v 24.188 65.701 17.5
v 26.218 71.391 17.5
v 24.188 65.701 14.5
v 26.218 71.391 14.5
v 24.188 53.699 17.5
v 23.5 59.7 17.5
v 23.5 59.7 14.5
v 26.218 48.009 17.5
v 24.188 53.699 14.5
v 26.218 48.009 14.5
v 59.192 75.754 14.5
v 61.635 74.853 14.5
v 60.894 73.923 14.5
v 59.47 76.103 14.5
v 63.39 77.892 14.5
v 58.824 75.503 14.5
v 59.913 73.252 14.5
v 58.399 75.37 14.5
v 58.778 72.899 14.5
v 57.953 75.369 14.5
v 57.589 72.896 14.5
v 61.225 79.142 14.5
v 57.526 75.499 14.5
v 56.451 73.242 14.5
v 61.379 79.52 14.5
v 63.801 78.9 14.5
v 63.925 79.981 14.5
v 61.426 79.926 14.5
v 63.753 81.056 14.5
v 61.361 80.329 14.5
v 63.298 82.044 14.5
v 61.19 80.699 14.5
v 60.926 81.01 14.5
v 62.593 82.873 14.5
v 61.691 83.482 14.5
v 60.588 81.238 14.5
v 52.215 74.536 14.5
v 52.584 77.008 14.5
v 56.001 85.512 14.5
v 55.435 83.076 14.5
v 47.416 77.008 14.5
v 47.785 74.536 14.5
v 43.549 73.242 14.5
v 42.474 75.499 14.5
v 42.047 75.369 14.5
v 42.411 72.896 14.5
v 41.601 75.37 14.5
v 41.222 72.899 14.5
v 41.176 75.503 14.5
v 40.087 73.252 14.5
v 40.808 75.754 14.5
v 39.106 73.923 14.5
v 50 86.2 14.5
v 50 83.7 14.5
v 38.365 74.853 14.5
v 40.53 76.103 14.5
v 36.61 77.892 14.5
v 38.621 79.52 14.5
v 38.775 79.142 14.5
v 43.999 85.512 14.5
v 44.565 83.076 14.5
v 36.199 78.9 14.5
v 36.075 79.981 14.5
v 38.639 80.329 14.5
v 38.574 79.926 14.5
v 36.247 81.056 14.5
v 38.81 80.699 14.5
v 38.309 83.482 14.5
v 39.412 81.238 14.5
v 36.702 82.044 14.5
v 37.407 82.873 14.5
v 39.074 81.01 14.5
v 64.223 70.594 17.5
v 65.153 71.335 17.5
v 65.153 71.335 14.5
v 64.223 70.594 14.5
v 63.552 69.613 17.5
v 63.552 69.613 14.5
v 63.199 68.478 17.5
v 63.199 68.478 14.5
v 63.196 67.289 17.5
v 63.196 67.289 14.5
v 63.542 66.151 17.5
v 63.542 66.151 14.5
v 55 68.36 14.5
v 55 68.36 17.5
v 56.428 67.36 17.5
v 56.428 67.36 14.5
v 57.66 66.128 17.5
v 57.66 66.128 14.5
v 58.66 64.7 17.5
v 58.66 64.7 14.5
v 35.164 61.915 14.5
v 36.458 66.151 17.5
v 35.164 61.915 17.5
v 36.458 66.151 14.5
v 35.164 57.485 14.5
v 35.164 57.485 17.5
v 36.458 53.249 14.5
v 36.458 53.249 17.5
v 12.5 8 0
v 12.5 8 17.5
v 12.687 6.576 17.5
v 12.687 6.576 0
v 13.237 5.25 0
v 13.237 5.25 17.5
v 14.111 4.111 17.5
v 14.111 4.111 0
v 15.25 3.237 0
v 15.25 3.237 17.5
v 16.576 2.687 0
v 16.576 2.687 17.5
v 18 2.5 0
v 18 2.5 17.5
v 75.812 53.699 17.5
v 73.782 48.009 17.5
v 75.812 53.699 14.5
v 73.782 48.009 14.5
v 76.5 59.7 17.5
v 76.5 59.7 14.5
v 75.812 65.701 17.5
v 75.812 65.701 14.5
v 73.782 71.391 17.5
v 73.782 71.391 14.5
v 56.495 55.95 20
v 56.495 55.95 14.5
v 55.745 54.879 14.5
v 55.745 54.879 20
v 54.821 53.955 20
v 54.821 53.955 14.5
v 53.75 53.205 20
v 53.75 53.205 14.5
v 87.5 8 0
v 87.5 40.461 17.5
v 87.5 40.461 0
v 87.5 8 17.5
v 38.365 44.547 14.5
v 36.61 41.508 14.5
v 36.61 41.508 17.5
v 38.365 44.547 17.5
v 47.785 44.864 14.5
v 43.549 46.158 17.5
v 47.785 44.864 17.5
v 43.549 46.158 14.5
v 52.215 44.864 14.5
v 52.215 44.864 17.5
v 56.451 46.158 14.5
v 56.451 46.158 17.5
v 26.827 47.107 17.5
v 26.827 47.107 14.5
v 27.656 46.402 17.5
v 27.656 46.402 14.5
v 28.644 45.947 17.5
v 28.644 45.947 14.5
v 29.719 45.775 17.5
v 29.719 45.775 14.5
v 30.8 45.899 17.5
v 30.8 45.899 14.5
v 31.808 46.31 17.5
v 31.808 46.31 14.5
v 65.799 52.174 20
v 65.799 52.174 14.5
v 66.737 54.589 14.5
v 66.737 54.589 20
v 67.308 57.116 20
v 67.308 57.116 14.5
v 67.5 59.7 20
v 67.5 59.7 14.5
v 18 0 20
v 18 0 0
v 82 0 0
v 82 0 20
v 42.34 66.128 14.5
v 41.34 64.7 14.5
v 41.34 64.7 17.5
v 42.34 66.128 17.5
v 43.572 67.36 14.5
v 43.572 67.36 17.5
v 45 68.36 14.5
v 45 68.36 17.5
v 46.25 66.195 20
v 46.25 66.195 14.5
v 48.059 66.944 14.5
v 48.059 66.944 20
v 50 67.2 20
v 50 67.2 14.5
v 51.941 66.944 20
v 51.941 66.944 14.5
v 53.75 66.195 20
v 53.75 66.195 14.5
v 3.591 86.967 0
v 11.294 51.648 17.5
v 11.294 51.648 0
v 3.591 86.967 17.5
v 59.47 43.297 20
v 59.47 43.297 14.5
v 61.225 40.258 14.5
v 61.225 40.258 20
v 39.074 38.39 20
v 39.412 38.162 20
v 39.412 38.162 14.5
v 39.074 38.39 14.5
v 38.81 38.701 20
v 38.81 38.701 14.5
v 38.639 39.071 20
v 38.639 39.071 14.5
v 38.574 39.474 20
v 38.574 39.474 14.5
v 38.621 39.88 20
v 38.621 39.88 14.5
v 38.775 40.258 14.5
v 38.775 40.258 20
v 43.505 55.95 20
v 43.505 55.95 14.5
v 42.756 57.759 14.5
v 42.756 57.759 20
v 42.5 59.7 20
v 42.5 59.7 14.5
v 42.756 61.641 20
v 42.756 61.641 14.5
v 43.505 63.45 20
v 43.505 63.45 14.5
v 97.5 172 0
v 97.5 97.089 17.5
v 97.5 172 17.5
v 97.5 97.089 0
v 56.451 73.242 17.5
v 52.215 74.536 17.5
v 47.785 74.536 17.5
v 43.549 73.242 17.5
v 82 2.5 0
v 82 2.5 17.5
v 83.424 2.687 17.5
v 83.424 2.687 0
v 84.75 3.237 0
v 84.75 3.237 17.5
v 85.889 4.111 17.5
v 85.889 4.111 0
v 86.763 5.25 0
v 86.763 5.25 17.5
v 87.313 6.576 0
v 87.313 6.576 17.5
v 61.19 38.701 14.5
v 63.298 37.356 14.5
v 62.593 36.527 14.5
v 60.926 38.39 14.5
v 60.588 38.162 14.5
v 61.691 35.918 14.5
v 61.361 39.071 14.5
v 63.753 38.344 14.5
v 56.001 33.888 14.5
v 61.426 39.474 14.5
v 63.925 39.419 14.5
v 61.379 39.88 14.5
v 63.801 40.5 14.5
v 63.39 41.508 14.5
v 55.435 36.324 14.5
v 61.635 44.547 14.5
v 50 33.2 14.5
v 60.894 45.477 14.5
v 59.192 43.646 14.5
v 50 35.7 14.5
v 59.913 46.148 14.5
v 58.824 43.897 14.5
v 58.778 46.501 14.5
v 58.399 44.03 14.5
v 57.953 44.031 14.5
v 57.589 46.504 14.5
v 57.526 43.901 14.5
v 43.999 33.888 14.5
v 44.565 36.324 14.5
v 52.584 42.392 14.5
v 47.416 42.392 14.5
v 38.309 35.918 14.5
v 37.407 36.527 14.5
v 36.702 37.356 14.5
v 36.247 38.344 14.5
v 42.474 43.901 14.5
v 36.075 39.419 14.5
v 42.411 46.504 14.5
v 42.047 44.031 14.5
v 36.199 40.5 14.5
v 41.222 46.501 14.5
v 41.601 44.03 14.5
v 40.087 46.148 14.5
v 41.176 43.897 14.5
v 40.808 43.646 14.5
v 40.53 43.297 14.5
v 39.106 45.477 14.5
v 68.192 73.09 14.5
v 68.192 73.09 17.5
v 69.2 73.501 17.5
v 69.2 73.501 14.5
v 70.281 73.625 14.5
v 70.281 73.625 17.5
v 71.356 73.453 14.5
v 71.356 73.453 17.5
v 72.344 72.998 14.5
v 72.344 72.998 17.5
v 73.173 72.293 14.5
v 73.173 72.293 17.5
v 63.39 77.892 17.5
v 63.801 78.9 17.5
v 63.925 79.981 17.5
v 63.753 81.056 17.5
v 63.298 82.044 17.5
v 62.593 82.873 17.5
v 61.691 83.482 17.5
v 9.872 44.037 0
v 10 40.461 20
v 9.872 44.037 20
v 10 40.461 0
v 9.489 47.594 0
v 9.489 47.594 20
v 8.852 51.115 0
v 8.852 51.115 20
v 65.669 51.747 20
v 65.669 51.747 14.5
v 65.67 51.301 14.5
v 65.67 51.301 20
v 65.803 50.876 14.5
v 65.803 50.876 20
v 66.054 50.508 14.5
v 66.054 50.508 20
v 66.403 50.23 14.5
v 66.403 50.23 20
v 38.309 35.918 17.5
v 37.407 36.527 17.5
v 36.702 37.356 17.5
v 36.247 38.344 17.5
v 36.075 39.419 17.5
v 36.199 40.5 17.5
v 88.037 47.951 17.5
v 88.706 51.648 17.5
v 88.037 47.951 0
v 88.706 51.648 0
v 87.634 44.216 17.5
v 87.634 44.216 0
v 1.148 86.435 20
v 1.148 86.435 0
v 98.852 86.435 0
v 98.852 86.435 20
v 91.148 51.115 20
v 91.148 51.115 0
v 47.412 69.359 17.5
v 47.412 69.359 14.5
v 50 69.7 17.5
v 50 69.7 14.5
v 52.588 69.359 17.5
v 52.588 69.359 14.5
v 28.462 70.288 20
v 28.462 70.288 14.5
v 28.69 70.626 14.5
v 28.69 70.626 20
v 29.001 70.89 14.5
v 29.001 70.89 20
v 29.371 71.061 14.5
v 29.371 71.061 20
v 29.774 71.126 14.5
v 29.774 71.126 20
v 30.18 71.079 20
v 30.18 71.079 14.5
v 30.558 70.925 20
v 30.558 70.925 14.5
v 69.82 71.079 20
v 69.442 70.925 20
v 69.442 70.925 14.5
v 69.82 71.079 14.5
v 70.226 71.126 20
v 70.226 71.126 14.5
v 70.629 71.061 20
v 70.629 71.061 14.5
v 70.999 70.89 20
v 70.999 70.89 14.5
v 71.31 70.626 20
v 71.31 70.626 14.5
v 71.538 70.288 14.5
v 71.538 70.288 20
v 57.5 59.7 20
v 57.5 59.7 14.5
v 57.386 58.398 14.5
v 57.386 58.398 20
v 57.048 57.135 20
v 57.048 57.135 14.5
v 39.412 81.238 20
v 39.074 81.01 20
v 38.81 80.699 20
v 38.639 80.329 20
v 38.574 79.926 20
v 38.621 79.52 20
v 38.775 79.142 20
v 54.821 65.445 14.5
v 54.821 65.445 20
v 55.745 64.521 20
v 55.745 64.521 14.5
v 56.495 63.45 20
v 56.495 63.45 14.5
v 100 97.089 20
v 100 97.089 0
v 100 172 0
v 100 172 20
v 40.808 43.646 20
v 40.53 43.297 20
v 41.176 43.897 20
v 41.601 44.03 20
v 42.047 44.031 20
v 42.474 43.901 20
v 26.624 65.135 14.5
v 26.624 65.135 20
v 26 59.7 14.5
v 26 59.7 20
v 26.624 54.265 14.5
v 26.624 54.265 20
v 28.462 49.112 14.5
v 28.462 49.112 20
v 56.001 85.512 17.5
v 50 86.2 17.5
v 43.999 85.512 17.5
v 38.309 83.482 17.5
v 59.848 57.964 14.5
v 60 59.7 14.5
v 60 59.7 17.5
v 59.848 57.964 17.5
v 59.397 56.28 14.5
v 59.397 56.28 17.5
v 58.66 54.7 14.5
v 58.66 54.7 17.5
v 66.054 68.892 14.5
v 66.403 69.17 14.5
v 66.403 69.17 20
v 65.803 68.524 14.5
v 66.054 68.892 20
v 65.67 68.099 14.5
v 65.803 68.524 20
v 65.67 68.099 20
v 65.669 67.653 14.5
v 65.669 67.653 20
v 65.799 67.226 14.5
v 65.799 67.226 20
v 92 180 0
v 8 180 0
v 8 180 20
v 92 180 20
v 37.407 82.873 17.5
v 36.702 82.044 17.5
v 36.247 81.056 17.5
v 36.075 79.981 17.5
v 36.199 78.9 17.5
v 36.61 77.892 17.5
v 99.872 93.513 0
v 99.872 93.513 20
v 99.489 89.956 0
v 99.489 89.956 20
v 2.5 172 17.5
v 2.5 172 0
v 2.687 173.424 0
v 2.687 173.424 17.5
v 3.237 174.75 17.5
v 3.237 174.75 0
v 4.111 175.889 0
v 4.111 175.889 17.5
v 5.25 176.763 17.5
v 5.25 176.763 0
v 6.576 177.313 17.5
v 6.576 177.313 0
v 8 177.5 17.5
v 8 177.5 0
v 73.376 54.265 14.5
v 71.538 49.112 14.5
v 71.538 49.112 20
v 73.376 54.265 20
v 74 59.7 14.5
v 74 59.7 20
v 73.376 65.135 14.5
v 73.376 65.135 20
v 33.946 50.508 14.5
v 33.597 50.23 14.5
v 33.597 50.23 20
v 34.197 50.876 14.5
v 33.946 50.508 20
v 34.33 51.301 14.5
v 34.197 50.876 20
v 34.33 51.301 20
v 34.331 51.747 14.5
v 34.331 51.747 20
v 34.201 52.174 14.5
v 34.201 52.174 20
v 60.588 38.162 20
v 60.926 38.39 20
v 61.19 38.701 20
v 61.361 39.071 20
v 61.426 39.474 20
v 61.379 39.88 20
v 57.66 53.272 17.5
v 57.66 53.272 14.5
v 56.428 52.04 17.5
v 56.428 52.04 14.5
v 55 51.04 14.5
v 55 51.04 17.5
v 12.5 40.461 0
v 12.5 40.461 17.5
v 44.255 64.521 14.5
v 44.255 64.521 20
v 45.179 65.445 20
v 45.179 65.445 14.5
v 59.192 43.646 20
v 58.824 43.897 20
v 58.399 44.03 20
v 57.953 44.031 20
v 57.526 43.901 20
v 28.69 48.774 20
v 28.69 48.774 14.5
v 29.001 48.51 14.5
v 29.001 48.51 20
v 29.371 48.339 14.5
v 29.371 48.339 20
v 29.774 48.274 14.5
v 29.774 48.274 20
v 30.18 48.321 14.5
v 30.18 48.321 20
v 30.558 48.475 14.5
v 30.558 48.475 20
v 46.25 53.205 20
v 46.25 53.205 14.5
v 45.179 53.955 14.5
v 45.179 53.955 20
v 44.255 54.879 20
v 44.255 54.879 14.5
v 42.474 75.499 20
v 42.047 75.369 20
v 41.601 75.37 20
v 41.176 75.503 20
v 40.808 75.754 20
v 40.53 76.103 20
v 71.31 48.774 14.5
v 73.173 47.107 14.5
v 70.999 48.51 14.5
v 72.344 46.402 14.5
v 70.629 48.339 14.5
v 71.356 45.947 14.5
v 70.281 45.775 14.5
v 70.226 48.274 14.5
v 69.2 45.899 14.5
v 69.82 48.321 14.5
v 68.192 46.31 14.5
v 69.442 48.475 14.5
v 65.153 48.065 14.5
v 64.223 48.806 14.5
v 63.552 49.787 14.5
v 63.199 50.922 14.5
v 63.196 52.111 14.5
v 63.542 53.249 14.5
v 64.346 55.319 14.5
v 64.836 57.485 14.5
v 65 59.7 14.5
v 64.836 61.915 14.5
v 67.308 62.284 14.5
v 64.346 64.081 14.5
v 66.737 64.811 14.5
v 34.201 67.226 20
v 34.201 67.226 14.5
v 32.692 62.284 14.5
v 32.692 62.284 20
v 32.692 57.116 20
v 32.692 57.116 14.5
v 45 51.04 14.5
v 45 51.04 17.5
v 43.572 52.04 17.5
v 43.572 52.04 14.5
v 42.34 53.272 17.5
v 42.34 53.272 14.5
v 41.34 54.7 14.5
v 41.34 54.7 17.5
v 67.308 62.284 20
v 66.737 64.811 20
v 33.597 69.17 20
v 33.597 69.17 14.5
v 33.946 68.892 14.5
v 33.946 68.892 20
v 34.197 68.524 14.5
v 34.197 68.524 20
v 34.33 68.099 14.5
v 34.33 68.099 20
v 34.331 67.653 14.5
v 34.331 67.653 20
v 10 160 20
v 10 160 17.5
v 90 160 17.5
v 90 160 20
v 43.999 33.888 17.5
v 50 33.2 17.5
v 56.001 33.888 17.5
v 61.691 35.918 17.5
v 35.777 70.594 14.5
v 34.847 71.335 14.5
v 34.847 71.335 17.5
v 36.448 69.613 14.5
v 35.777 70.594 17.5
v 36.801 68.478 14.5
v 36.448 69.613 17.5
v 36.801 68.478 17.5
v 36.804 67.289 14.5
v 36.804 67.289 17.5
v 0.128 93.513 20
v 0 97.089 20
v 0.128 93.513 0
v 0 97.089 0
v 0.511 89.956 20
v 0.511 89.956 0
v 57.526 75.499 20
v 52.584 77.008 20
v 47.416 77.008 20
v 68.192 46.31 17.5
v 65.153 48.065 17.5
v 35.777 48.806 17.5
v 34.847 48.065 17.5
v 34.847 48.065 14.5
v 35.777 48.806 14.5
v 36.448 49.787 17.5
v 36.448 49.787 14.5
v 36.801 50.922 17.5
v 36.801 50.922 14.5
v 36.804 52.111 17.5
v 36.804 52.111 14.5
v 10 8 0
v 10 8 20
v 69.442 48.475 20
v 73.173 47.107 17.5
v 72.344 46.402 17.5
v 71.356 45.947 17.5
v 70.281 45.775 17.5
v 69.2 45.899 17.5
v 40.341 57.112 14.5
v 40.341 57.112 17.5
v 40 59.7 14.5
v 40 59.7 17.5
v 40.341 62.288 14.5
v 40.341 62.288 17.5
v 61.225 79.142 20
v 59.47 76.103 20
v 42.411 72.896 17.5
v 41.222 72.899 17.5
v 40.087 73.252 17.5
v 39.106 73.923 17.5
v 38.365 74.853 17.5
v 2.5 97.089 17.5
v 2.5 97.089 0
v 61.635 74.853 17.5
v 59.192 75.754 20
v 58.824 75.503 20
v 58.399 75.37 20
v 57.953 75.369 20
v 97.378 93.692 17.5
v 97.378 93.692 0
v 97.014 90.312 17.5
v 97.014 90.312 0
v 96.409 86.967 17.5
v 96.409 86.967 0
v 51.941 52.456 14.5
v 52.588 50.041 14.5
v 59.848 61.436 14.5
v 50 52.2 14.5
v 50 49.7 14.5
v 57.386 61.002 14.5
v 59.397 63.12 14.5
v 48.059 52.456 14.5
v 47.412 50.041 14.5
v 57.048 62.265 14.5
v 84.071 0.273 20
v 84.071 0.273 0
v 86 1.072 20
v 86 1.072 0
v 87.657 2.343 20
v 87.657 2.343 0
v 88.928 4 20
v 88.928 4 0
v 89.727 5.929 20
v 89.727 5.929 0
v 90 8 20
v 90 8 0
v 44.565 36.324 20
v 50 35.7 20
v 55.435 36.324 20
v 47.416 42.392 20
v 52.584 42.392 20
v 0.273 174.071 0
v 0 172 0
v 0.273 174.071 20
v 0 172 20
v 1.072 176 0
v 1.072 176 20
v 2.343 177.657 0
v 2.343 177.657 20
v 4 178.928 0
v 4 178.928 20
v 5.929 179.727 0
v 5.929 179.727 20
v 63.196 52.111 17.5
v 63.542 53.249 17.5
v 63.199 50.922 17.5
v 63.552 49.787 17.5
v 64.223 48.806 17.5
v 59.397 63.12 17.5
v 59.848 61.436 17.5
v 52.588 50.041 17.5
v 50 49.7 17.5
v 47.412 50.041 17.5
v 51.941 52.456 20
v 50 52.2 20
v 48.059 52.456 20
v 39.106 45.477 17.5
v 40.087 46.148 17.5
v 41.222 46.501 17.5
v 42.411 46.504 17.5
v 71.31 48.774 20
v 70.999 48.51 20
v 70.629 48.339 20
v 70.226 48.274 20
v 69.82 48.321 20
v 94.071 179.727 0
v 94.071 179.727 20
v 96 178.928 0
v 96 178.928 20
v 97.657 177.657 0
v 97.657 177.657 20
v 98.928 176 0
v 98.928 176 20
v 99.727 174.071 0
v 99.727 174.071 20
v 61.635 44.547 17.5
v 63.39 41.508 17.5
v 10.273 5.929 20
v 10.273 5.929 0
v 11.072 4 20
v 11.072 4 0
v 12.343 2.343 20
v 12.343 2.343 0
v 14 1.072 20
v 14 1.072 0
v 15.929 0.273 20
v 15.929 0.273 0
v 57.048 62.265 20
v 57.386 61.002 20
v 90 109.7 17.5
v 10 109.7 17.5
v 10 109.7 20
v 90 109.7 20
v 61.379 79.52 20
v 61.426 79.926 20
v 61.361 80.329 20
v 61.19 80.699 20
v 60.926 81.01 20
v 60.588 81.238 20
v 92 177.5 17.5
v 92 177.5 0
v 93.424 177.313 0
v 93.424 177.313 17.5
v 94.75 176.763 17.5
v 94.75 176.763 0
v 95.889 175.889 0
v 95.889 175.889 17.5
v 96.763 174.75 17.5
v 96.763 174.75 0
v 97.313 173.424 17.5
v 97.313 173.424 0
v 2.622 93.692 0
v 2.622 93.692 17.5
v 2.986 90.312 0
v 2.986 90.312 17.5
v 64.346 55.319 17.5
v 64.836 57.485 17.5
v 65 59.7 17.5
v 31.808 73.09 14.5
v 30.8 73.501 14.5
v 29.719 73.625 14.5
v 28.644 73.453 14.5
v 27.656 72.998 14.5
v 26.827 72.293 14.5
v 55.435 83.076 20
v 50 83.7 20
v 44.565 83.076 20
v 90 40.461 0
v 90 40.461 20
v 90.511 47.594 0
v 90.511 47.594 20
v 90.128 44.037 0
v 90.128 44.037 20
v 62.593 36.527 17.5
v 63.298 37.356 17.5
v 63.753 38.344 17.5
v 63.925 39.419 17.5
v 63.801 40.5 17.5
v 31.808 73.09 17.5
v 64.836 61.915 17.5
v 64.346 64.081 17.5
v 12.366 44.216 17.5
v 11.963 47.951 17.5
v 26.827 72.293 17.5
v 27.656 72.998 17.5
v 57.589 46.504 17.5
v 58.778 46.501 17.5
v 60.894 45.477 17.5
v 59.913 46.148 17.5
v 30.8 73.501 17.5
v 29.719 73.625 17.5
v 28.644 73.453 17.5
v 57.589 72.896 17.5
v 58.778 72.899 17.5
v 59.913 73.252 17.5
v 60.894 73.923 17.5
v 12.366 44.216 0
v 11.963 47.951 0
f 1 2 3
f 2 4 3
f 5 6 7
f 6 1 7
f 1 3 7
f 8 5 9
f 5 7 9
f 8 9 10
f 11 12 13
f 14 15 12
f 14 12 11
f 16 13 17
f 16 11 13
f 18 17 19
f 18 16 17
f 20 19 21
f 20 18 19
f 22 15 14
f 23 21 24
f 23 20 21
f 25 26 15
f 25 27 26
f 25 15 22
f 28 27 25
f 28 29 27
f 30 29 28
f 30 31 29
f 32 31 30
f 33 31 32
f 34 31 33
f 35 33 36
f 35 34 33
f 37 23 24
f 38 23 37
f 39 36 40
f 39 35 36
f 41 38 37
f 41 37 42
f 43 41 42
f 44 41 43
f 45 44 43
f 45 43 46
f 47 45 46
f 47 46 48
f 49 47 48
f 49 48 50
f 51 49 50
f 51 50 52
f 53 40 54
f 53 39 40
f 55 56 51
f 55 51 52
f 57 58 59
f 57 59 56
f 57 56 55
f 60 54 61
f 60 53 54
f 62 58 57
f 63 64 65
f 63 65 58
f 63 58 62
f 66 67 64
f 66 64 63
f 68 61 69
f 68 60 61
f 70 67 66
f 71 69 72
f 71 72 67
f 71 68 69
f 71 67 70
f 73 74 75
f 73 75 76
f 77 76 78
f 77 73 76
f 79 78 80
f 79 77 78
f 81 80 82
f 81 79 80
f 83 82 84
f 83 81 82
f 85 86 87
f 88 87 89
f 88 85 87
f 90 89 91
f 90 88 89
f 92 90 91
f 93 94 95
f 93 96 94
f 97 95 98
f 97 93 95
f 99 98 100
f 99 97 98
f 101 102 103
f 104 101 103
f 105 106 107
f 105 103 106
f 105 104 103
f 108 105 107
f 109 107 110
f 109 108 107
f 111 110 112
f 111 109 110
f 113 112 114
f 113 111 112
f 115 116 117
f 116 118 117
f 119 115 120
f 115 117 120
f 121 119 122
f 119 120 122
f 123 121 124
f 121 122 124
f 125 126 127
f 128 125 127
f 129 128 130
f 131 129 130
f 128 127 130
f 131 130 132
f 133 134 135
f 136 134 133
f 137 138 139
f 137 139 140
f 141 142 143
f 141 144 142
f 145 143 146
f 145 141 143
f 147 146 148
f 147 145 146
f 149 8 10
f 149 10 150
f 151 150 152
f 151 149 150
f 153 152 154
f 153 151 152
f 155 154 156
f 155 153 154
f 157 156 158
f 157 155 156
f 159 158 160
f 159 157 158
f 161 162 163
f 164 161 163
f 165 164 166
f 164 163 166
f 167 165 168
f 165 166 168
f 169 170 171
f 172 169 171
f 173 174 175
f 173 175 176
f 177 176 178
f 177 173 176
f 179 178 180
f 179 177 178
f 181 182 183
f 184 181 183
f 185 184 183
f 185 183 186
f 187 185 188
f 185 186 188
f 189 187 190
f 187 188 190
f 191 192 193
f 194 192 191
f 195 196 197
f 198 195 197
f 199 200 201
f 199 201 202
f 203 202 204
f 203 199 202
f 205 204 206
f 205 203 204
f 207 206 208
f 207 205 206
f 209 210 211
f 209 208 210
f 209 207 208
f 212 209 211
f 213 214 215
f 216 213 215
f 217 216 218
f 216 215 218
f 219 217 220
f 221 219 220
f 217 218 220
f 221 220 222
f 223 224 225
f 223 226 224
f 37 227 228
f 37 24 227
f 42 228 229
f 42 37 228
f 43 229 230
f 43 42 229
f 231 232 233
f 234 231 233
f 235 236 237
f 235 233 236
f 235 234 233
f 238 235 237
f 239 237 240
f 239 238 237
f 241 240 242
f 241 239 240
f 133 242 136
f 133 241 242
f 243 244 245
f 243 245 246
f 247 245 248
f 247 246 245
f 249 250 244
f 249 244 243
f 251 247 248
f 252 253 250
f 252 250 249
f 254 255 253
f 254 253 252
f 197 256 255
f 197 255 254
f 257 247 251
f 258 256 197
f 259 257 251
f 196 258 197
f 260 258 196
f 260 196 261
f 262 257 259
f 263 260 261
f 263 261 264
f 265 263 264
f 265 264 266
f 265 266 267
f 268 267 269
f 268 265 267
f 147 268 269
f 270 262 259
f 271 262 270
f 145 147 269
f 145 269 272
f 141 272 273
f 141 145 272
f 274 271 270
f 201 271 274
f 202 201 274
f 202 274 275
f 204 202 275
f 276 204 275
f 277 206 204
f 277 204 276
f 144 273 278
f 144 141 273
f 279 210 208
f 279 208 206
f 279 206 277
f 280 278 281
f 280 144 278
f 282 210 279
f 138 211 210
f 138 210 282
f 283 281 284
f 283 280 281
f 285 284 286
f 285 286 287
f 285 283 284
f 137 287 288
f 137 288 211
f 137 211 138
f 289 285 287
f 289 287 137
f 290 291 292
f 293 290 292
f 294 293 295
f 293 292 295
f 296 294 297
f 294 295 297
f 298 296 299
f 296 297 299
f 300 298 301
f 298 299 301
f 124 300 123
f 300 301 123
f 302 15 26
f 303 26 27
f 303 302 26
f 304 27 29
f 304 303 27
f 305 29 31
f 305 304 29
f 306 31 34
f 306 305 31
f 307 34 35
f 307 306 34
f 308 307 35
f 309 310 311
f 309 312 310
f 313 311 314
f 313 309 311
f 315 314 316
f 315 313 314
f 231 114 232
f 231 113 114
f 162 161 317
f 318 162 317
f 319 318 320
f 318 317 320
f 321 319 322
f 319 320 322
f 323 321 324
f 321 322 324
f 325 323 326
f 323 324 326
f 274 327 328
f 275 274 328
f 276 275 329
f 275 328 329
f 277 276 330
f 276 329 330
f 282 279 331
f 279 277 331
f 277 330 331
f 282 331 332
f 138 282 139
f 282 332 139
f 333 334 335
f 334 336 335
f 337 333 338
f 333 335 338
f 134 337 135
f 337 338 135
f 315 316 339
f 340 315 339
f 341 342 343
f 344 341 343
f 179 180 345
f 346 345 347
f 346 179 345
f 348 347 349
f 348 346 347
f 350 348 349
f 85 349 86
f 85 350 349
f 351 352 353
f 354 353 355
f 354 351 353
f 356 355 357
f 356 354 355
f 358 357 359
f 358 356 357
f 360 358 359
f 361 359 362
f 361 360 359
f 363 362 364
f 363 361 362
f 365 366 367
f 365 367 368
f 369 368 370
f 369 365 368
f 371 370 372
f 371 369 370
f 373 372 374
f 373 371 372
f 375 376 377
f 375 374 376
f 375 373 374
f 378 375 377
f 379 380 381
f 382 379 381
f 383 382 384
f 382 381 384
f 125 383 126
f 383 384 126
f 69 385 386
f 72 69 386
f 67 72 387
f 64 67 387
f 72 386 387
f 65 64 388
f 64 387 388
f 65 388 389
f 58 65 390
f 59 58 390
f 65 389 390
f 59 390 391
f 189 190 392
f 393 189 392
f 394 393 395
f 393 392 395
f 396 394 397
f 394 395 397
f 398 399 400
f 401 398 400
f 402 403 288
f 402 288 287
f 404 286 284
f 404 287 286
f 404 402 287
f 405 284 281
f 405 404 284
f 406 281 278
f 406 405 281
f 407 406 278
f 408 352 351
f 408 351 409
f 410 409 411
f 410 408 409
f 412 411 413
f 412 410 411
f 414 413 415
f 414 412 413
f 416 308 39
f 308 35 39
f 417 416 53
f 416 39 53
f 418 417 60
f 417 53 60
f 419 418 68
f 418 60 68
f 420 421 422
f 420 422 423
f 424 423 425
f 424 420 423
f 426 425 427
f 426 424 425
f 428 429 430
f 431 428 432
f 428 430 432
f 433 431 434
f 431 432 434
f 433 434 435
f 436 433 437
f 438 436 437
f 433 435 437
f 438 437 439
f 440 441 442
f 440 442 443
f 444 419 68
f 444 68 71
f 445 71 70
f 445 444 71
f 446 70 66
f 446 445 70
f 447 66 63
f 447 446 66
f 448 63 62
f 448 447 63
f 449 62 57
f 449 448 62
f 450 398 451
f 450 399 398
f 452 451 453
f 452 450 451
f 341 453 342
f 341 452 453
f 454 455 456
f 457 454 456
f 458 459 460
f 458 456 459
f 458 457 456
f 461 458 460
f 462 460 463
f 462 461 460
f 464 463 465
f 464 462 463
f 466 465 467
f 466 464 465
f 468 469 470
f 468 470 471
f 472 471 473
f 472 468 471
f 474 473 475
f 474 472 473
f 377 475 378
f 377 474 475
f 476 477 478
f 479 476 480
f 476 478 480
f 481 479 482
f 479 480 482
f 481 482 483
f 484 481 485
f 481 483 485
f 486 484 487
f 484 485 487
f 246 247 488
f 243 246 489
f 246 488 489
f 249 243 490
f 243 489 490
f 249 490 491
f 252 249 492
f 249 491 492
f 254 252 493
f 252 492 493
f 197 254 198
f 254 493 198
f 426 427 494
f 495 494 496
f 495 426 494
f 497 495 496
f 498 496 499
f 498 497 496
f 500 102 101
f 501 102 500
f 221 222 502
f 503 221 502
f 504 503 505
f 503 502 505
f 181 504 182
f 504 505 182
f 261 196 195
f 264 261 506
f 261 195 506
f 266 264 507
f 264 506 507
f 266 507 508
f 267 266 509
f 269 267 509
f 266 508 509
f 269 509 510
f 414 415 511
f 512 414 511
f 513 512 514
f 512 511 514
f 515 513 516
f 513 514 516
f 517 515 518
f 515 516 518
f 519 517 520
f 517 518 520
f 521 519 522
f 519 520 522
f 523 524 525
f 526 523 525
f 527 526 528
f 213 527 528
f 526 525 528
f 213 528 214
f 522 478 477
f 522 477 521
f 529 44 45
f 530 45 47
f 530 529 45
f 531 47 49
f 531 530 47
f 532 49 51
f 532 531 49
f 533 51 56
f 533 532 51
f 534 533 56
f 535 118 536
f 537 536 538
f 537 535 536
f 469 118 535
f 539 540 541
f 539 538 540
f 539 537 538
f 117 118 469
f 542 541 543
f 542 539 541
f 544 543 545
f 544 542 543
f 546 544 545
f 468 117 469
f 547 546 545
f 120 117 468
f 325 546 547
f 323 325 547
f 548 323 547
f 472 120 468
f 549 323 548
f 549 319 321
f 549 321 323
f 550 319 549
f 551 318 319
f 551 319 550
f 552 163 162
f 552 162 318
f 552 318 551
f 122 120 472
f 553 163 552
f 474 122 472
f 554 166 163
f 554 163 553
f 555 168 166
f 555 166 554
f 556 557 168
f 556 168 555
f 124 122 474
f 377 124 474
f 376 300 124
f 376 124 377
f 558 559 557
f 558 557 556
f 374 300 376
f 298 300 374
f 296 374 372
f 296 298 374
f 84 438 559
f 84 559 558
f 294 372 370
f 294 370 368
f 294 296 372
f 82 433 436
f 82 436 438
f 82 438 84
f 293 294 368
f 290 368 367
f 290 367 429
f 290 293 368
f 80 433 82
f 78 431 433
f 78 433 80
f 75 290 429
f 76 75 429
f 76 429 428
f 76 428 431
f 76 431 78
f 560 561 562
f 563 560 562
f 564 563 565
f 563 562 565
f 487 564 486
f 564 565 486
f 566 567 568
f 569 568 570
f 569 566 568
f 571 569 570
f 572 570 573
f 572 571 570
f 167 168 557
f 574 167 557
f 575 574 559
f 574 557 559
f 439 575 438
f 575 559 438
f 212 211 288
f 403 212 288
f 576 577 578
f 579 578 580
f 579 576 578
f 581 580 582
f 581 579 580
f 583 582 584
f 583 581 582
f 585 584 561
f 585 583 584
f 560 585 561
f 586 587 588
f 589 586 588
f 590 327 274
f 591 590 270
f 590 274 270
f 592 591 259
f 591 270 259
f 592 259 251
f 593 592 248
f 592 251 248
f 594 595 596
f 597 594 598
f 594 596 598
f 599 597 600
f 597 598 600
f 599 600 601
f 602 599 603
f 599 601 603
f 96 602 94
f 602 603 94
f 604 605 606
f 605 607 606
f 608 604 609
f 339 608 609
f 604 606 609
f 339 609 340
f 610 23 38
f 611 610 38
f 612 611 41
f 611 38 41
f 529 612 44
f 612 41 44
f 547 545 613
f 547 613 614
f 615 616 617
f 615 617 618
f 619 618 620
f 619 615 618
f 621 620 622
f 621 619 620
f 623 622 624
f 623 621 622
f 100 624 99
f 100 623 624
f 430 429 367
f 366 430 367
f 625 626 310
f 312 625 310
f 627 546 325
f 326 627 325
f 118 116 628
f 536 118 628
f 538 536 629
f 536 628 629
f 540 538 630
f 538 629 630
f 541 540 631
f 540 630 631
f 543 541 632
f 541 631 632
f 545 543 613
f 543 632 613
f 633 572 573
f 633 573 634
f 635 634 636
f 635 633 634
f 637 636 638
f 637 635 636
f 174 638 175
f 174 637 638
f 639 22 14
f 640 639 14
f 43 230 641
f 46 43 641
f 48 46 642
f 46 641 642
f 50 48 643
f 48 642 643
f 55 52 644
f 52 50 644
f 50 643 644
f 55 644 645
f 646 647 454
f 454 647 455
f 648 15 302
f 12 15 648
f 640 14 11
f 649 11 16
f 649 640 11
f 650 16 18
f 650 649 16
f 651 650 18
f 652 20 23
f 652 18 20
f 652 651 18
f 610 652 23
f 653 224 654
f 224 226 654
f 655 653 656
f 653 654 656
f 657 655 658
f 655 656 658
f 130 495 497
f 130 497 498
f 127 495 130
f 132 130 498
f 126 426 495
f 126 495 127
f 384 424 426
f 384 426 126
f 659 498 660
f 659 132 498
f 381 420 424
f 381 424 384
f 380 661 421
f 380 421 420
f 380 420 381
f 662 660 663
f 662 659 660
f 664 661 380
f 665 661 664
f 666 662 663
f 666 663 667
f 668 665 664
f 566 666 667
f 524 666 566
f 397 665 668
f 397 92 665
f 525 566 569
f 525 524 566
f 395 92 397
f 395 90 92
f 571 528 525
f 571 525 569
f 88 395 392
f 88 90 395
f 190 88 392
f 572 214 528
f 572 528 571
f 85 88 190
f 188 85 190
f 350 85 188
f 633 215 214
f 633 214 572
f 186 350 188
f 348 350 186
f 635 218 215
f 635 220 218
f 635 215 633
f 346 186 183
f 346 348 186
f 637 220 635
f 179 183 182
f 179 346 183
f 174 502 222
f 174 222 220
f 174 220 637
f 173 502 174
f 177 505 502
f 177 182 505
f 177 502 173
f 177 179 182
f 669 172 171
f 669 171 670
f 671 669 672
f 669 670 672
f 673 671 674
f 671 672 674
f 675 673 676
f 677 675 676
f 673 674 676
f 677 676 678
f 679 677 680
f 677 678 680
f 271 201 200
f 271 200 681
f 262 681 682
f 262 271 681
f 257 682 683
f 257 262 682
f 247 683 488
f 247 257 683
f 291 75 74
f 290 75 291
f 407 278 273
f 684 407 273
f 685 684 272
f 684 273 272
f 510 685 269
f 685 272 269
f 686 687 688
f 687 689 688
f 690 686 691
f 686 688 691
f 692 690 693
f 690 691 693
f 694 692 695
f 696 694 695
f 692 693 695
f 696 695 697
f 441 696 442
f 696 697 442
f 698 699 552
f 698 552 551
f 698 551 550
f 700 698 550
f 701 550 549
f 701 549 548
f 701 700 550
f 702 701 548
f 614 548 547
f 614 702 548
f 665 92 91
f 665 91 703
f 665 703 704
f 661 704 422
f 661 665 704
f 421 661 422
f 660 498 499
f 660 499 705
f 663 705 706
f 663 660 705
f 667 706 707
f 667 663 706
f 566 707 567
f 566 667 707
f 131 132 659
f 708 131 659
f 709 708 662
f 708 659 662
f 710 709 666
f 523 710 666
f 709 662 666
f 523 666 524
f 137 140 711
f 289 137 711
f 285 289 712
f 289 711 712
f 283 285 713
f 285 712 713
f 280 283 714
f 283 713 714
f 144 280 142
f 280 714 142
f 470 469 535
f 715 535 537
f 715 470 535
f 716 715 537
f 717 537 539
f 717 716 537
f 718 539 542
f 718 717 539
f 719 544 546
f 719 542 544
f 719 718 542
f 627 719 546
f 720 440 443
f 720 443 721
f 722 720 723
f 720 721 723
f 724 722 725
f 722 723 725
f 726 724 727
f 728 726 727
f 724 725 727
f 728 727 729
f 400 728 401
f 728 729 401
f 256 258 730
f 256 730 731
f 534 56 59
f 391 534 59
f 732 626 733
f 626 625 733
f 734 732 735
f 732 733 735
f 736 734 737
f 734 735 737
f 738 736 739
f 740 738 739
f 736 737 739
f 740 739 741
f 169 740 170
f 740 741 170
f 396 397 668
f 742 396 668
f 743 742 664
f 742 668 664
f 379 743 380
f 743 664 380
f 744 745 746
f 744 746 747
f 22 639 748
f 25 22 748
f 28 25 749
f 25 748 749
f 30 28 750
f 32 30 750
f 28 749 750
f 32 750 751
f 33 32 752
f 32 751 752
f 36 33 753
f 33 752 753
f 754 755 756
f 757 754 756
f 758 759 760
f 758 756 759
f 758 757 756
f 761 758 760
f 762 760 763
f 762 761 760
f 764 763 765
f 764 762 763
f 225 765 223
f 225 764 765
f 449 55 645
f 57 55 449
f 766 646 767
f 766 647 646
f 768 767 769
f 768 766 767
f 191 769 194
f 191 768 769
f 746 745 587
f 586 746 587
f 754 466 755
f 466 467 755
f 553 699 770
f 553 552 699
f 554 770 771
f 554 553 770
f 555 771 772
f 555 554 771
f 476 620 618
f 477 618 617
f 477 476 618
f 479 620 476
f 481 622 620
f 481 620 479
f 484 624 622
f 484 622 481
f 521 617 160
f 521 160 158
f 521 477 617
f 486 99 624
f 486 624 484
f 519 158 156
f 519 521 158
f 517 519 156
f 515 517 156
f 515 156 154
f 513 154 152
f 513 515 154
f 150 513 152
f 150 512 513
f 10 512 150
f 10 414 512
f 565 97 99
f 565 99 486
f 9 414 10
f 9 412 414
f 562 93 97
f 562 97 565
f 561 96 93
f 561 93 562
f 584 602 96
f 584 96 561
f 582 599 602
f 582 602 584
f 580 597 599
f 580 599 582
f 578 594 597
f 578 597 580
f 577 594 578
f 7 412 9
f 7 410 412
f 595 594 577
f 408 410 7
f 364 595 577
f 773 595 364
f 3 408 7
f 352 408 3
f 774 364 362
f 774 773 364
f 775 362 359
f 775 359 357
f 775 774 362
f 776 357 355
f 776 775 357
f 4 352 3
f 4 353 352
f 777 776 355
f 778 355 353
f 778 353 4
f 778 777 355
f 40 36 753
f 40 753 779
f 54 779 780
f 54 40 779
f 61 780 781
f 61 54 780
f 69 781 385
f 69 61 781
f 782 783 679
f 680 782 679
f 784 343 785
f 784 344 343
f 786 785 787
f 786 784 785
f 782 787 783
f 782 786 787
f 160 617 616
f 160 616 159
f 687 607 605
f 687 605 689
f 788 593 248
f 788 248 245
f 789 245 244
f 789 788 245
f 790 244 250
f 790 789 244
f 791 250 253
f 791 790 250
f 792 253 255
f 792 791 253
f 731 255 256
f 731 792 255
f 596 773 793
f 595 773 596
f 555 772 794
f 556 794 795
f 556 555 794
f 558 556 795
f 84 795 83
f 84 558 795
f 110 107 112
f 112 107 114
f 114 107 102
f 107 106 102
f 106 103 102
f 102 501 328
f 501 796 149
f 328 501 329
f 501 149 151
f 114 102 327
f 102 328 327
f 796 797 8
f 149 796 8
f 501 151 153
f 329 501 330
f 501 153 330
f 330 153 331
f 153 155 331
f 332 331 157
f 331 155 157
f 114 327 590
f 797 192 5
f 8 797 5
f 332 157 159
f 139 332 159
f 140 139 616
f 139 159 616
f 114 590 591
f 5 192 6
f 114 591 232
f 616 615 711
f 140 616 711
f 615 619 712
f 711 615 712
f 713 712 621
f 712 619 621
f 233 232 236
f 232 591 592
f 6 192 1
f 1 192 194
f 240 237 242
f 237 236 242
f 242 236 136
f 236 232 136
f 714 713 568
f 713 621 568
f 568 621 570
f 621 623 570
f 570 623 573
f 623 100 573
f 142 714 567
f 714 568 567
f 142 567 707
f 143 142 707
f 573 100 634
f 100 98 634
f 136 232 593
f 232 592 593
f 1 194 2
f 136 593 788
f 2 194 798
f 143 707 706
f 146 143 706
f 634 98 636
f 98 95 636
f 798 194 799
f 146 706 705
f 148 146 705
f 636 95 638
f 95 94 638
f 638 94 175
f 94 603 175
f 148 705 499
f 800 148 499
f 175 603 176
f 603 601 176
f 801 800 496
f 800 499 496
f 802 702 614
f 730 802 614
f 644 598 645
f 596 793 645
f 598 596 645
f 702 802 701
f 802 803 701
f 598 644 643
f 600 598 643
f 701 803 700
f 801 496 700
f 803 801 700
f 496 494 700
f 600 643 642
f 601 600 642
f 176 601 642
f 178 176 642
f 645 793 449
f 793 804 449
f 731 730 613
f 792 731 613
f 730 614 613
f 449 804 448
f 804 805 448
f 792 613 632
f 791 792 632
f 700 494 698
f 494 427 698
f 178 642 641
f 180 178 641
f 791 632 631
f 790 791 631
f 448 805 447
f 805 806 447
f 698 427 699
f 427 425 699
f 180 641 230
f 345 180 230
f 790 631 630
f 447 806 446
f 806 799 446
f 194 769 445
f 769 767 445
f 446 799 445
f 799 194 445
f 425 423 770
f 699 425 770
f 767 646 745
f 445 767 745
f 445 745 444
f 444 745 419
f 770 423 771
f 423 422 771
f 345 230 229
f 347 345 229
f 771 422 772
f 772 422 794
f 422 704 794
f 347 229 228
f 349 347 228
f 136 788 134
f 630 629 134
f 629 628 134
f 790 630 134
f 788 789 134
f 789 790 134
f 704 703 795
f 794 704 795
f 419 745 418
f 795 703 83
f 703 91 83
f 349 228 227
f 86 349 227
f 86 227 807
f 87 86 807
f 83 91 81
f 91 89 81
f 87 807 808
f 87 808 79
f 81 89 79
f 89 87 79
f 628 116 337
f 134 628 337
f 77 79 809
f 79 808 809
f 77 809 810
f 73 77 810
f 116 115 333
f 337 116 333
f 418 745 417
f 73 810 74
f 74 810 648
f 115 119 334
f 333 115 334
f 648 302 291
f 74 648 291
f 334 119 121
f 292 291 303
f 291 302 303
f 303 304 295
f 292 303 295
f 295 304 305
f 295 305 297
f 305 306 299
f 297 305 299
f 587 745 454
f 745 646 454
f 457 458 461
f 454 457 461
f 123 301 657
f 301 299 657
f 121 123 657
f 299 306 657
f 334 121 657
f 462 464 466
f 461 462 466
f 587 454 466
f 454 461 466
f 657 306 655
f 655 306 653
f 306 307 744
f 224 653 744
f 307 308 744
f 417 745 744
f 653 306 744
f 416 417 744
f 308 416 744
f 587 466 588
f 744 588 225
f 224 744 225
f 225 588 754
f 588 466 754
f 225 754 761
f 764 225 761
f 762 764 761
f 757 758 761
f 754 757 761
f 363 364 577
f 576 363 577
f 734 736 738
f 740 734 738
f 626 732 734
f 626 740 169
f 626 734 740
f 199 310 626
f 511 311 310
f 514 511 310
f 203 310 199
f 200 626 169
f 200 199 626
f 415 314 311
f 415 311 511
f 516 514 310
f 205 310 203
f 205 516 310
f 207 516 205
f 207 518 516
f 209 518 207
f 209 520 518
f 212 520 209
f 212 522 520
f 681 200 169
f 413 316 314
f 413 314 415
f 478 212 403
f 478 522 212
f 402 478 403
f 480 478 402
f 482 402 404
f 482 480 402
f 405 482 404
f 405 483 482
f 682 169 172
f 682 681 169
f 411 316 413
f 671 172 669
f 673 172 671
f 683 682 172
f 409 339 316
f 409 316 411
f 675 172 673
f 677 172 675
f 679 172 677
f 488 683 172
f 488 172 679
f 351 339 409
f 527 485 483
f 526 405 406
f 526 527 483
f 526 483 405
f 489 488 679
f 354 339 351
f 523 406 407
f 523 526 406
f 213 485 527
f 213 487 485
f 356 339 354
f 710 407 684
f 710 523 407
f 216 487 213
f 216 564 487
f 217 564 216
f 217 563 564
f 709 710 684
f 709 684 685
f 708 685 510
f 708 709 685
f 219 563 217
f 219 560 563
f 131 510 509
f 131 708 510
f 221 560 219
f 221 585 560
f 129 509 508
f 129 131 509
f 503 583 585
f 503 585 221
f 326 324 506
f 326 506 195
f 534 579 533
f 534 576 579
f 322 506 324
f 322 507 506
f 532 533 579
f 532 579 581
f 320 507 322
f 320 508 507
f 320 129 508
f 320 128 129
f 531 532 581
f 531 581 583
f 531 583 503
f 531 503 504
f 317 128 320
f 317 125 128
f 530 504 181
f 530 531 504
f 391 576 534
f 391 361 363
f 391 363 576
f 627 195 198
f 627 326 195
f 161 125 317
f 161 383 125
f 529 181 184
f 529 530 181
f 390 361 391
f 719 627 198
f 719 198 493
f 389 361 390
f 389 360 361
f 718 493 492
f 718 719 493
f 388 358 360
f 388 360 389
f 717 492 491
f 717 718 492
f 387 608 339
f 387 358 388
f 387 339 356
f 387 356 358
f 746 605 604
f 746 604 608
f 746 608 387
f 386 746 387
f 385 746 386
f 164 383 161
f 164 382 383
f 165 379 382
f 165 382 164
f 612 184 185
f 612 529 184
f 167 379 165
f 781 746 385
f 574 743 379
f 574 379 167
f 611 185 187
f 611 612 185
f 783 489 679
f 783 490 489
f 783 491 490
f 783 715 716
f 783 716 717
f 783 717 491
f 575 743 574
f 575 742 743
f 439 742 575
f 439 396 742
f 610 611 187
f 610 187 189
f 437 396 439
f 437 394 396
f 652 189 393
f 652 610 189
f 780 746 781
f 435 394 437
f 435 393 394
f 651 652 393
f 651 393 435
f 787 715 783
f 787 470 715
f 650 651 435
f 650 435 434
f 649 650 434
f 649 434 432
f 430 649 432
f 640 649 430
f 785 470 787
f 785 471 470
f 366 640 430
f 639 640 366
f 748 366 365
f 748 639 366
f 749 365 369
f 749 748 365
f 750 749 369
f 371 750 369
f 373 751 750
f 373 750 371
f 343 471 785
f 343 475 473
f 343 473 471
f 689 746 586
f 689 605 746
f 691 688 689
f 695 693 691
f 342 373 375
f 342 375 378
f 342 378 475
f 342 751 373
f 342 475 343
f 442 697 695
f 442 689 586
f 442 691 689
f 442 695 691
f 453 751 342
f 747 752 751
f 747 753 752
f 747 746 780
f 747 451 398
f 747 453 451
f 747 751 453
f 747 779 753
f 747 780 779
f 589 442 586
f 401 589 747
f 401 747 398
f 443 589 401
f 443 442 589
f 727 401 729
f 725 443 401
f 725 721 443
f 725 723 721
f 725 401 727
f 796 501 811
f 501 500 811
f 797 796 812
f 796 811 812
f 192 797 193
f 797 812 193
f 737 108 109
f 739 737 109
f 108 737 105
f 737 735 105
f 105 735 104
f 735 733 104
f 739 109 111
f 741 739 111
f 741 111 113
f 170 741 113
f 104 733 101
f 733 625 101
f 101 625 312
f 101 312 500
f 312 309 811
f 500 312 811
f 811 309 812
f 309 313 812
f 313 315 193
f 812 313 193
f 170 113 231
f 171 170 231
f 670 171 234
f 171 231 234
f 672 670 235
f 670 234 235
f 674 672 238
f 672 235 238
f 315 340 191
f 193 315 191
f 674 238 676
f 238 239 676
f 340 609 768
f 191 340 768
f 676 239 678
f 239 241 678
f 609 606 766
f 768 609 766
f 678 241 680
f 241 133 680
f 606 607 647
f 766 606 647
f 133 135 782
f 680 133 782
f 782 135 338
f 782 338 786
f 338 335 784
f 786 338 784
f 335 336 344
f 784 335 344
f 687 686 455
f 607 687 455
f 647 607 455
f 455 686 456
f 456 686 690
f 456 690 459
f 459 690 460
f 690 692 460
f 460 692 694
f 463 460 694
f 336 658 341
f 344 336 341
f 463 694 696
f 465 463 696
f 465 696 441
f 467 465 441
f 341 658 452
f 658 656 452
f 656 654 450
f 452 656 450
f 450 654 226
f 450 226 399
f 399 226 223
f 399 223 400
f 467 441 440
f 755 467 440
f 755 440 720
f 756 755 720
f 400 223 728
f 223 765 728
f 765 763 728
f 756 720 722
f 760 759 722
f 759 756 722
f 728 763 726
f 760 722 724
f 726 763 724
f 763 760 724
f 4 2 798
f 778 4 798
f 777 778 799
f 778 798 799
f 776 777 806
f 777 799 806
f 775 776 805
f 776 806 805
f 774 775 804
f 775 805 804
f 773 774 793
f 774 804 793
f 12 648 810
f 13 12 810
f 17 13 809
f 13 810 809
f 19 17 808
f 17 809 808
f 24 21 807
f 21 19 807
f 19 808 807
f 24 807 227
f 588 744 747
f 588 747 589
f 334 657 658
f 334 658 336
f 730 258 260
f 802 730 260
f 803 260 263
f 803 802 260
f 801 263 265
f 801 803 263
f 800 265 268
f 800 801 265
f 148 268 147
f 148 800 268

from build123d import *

# Parameters (mm, degrees)
ESBO_O1_W                = 100
ESBO_O1_H                = 180
ESBO_O1_R                = 24
ESBO_O1_W_2              = 80
ESBO_O1_H_2              = 50.3
RESSALTO_EXTRUS_O1_DEPTH = 20
CORTE_EXTRUS_O1_DEPTH    = 227.2
FILETE1_R                = 50
FILETE2_R                = 8
FILETE3_R                = 1.5
CASCA1_T                 = -2.5
CORTE_EXTRUS_O2_START    = 108.4
ESBO_O3_R                = 26.5
CORTE_EXTRUS_O2_DEPTH    = 105.4
ESBO_O4_W                = 85
ESBO_O4_H                = 55.3
CORTE_EXTRUS_O3_DEPTH    = 17.5


with BuildPart() as part:
    # Esboço1 → Ressalto-extrusão1 (new body)
    # profile 1 of 13: a face of its own
    with BuildSketch(Plane.XY):
        with Locations((50, 90)):
            Rectangle(ESBO_O1_W, ESBO_O1_H)
        with Locations((50, 59.7)):
            Circle(ESBO_O1_R, mode=Mode.SUBTRACT)
        with Locations((50, 134.85)):
            Rectangle(ESBO_O1_W_2, ESBO_O1_H_2, mode=Mode.SUBTRACT)
    # profile 2 of 13: a face of its own
    with BuildSketch(Plane.XY):
        with BuildLine():
            ThreePointArc((58.75, 74.855444566), (50, 77.2), (41.25, 74.855444566))
            Line((41.25, 74.855444566), (46.25, 66.195190528))
            ThreePointArc((46.25, 66.195190528), (50, 67.2), (53.75, 66.195190528))
            Line((53.75, 66.195190528), (58.75, 74.855444566))
        make_face()
    # profile 3 of 13: a face of its own
    with BuildSketch(Plane.XY):
        with BuildLine():
            Line((46.25, 66.195190528), (41.25, 74.855444566))
            ThreePointArc((41.25, 74.855444566), (37.625631329, 72.074368671), (34.844555434, 68.45))
            Line((34.844555434, 68.45), (43.504809472, 63.45))
            ThreePointArc((43.504809472, 63.45), (44.696699141, 65.003300859), (46.25, 66.195190528))
        make_face()
    # profile 4 of 13: a face of its own
    with BuildSketch(Plane.XY):
        with BuildLine():
            Line((43.504809472, 63.45), (34.844555434, 68.45))
            ThreePointArc((34.844555434, 68.45), (32.5, 59.7), (34.844555434, 50.95))
            Line((34.844555434, 50.95), (43.504809472, 55.95))
            ThreePointArc((43.504809472, 55.95), (42.5, 59.7), (43.504809472, 63.45))
        make_face()
    # profile 5 of 13: a face of its own
    with BuildSketch(Plane.XY):
        with BuildLine():
            Line((43.504809472, 55.95), (34.844555434, 50.95))
            ThreePointArc((34.844555434, 50.95), (37.625631329, 47.325631329), (41.25, 44.544555434))
            Line((41.25, 44.544555434), (46.25, 53.204809472))
            ThreePointArc((46.25, 53.204809472), (44.696699141, 54.396699141), (43.504809472, 55.95))
        make_face()
    # profile 6 of 13: a face of its own
    with BuildSketch(Plane.XY):
        with BuildLine():
            Line((58.75, 44.544555434), (53.75, 53.204809472))
            ThreePointArc((53.75, 53.204809472), (50, 52.2), (46.25, 53.204809472))
            Line((46.25, 53.204809472), (41.25, 44.544555434))
            ThreePointArc((41.25, 44.544555434), (50, 42.2), (58.75, 44.544555434))
        make_face()
    # profile 7 of 13: a face of its own
    with BuildSketch(Plane.XY):
        with BuildLine():
            ThreePointArc((67.5, 59.7), (66.90370196, 64.229333289), (65.155444566, 68.45))
            Line((65.155444566, 68.45), (56.495190528, 63.45))
            ThreePointArc((56.495190528, 63.45), (57.244443697, 61.641142838), (57.5, 59.7))
            ThreePointArc((57.5, 59.7), (57.244443697, 57.758857162), (56.495190528, 55.95))
            Line((56.495190528, 55.95), (65.155444566, 50.95))
            ThreePointArc((65.155444566, 50.95), (66.90370196, 55.170666711), (67.5, 59.7))
        make_face()
    # profile 8 of 13: a face of its own
    with BuildSketch(Plane.XY):
        with BuildLine():
            ThreePointArc((56.495190528, 55.95), (55.303300859, 54.396699141), (53.75, 53.204809472))
            Line((53.75, 53.204809472), (58.75, 44.544555434))
            ThreePointArc((58.75, 44.544555434), (62.374368671, 47.325631329), (65.155444566, 50.95))
            Line((65.155444566, 50.95), (56.495190528, 55.95))
        make_face()
    # profile 9 of 13: a face of its own
    with BuildSketch(Plane.XY):
        with BuildLine():
            ThreePointArc((65.155444566, 68.45), (62.374368671, 72.074368671), (58.75, 74.855444566))
            Line((58.75, 74.855444566), (53.75, 66.195190528))
            ThreePointArc((53.75, 66.195190528), (55.303300859, 65.003300859), (56.495190528, 63.45))
            Line((56.495190528, 63.45), (65.155444566, 68.45))
        make_face()
    # profile 10 of 13: a face of its own
    with BuildSketch(Plane.XY):
        with BuildLine():
            Line((41.25, 74.855444566), (38, 80.484609691))
            ThreePointArc((38, 80.484609691), (33.029437252, 76.670562748), (29.215390309, 71.7))
            Line((29.215390309, 71.7), (34.844555434, 68.45))
            ThreePointArc((34.844555434, 68.45), (37.625631329, 72.074368671), (41.25, 74.855444566))
        make_face()
    # profile 11 of 13: a face of its own
    with BuildSketch(Plane.XY):
        with BuildLine():
            Line((34.844555434, 50.95), (29.215390309, 47.7))
            ThreePointArc((29.215390309, 47.7), (33.029437252, 42.729437252), (38, 38.915390309))
            Line((38, 38.915390309), (41.25, 44.544555434))
            ThreePointArc((41.25, 44.544555434), (37.625631329, 47.325631329), (34.844555434, 50.95))
        make_face()
    # profile 12 of 13: a face of its own
    with BuildSketch(Plane.XY):
        with BuildLine():
            ThreePointArc((62, 38.915390309), (66.970562748, 42.729437252), (70.784609691, 47.7))
            Line((70.784609691, 47.7), (65.155444566, 50.95))
            ThreePointArc((65.155444566, 50.95), (62.374368671, 47.325631329), (58.75, 44.544555434))
            Line((58.75, 44.544555434), (62, 38.915390309))
        make_face()
    # profile 13 of 13: a face of its own
    with BuildSketch(Plane.XY):
        with BuildLine():
            ThreePointArc((70.784609691, 71.7), (66.970562748, 76.670562748), (62, 80.484609691))
            Line((62, 80.484609691), (58.75, 74.855444566))
            ThreePointArc((58.75, 74.855444566), (62.374368671, 72.074368671), (65.155444566, 68.45))
            Line((65.155444566, 68.45), (70.784609691, 71.7))
        make_face()
    extrude(amount=RESSALTO_EXTRUS_O1_DEPTH)

    # Esboço2 → Corte-extrusão1 (cut)
    with BuildSketch(Plane.XY.offset(20)):
        Polygon((10, 45.85), (0, 91.7), (0, 0), (10, 0), align=None)
        Polygon((90, 45.85), (90, 0), (100, 0), (100, 91.7), align=None)
    extrude(amount=-CORTE_EXTRUS_O1_DEPTH, mode=Mode.SUBTRACT)

    # Filete1
    filete1_edges = [part.edges().sort_by_distance(p)[0] for p in [
        (90, 45.85, 10),
        (0, 91.7, 10),
        (10, 45.85, 10),
        (100, 91.7, 10),
    ]]
    fillet(filete1_edges, radius=FILETE1_R)

    # Filete2
    filete2_edges = [part.edges().sort_by_distance(p)[0] for p in [
        (90, 0, 10),
        (0, 180, 10),
        (100, 180, 10),
        (10, 0, 10),
    ]]
    fillet(filete2_edges, radius=FILETE2_R)

    # Filete3
    filete3_edges = [part.edges().sort_by_distance(p)[0] for p in [
        (58.75, 74.855444566, 10),
        (62, 80.484609691, 10),
        (38, 80.484609691, 10),
        (41.25, 74.855444566, 10),
        (34.844555434, 68.45, 10),
        (29.215390309, 71.7, 10),
        (29.215390309, 47.7, 10),
        (34.844555434, 50.95, 10),
        (70.784609691, 47.7, 10),
        (70.784609691, 71.7, 10),
        (65.155444566, 68.45, 10),
        (65.155444566, 50.95, 10),
        (41.25, 44.544555434, 10),
        (38, 38.915390309, 10),
        (62, 38.915390309, 10),
        (58.75, 44.544555434, 10),
    ]]
    fillet(filete3_edges, radius=FILETE3_R)

    # Casca1
    casca1_openings = [part.faces().sort_by_distance(p)[0] for p in [
        (50, 40.944516246, 0),
    ]]
    offset(amount=CASCA1_T, openings=casca1_openings, kind=Kind.INTERSECTION)

    # Esboço3 → Corte-extrusão2 (cut)
    with BuildSketch(Plane(origin=(0, 0, 17.5), x_dir=(-1, 0, 0), z_dir=(0, 0, -1)).offset(CORTE_EXTRUS_O2_START)):
        with Locations((-50, 59.7)):
            Circle(ESBO_O3_R)
    extrude(amount=-CORTE_EXTRUS_O2_DEPTH, mode=Mode.SUBTRACT)

    # Esboço4 → Corte-extrusão3 (cut)
    with BuildSketch(Plane(origin=(0, 0, 0), x_dir=(-1, 0, 0), z_dir=(0, 0, -1))):
        with Locations((-50, 134.85)):
            Rectangle(ESBO_O4_W, ESBO_O4_H)
    extrude(amount=-CORTE_EXTRUS_O3_DEPTH, mode=Mode.SUBTRACT)


solid = part.part
